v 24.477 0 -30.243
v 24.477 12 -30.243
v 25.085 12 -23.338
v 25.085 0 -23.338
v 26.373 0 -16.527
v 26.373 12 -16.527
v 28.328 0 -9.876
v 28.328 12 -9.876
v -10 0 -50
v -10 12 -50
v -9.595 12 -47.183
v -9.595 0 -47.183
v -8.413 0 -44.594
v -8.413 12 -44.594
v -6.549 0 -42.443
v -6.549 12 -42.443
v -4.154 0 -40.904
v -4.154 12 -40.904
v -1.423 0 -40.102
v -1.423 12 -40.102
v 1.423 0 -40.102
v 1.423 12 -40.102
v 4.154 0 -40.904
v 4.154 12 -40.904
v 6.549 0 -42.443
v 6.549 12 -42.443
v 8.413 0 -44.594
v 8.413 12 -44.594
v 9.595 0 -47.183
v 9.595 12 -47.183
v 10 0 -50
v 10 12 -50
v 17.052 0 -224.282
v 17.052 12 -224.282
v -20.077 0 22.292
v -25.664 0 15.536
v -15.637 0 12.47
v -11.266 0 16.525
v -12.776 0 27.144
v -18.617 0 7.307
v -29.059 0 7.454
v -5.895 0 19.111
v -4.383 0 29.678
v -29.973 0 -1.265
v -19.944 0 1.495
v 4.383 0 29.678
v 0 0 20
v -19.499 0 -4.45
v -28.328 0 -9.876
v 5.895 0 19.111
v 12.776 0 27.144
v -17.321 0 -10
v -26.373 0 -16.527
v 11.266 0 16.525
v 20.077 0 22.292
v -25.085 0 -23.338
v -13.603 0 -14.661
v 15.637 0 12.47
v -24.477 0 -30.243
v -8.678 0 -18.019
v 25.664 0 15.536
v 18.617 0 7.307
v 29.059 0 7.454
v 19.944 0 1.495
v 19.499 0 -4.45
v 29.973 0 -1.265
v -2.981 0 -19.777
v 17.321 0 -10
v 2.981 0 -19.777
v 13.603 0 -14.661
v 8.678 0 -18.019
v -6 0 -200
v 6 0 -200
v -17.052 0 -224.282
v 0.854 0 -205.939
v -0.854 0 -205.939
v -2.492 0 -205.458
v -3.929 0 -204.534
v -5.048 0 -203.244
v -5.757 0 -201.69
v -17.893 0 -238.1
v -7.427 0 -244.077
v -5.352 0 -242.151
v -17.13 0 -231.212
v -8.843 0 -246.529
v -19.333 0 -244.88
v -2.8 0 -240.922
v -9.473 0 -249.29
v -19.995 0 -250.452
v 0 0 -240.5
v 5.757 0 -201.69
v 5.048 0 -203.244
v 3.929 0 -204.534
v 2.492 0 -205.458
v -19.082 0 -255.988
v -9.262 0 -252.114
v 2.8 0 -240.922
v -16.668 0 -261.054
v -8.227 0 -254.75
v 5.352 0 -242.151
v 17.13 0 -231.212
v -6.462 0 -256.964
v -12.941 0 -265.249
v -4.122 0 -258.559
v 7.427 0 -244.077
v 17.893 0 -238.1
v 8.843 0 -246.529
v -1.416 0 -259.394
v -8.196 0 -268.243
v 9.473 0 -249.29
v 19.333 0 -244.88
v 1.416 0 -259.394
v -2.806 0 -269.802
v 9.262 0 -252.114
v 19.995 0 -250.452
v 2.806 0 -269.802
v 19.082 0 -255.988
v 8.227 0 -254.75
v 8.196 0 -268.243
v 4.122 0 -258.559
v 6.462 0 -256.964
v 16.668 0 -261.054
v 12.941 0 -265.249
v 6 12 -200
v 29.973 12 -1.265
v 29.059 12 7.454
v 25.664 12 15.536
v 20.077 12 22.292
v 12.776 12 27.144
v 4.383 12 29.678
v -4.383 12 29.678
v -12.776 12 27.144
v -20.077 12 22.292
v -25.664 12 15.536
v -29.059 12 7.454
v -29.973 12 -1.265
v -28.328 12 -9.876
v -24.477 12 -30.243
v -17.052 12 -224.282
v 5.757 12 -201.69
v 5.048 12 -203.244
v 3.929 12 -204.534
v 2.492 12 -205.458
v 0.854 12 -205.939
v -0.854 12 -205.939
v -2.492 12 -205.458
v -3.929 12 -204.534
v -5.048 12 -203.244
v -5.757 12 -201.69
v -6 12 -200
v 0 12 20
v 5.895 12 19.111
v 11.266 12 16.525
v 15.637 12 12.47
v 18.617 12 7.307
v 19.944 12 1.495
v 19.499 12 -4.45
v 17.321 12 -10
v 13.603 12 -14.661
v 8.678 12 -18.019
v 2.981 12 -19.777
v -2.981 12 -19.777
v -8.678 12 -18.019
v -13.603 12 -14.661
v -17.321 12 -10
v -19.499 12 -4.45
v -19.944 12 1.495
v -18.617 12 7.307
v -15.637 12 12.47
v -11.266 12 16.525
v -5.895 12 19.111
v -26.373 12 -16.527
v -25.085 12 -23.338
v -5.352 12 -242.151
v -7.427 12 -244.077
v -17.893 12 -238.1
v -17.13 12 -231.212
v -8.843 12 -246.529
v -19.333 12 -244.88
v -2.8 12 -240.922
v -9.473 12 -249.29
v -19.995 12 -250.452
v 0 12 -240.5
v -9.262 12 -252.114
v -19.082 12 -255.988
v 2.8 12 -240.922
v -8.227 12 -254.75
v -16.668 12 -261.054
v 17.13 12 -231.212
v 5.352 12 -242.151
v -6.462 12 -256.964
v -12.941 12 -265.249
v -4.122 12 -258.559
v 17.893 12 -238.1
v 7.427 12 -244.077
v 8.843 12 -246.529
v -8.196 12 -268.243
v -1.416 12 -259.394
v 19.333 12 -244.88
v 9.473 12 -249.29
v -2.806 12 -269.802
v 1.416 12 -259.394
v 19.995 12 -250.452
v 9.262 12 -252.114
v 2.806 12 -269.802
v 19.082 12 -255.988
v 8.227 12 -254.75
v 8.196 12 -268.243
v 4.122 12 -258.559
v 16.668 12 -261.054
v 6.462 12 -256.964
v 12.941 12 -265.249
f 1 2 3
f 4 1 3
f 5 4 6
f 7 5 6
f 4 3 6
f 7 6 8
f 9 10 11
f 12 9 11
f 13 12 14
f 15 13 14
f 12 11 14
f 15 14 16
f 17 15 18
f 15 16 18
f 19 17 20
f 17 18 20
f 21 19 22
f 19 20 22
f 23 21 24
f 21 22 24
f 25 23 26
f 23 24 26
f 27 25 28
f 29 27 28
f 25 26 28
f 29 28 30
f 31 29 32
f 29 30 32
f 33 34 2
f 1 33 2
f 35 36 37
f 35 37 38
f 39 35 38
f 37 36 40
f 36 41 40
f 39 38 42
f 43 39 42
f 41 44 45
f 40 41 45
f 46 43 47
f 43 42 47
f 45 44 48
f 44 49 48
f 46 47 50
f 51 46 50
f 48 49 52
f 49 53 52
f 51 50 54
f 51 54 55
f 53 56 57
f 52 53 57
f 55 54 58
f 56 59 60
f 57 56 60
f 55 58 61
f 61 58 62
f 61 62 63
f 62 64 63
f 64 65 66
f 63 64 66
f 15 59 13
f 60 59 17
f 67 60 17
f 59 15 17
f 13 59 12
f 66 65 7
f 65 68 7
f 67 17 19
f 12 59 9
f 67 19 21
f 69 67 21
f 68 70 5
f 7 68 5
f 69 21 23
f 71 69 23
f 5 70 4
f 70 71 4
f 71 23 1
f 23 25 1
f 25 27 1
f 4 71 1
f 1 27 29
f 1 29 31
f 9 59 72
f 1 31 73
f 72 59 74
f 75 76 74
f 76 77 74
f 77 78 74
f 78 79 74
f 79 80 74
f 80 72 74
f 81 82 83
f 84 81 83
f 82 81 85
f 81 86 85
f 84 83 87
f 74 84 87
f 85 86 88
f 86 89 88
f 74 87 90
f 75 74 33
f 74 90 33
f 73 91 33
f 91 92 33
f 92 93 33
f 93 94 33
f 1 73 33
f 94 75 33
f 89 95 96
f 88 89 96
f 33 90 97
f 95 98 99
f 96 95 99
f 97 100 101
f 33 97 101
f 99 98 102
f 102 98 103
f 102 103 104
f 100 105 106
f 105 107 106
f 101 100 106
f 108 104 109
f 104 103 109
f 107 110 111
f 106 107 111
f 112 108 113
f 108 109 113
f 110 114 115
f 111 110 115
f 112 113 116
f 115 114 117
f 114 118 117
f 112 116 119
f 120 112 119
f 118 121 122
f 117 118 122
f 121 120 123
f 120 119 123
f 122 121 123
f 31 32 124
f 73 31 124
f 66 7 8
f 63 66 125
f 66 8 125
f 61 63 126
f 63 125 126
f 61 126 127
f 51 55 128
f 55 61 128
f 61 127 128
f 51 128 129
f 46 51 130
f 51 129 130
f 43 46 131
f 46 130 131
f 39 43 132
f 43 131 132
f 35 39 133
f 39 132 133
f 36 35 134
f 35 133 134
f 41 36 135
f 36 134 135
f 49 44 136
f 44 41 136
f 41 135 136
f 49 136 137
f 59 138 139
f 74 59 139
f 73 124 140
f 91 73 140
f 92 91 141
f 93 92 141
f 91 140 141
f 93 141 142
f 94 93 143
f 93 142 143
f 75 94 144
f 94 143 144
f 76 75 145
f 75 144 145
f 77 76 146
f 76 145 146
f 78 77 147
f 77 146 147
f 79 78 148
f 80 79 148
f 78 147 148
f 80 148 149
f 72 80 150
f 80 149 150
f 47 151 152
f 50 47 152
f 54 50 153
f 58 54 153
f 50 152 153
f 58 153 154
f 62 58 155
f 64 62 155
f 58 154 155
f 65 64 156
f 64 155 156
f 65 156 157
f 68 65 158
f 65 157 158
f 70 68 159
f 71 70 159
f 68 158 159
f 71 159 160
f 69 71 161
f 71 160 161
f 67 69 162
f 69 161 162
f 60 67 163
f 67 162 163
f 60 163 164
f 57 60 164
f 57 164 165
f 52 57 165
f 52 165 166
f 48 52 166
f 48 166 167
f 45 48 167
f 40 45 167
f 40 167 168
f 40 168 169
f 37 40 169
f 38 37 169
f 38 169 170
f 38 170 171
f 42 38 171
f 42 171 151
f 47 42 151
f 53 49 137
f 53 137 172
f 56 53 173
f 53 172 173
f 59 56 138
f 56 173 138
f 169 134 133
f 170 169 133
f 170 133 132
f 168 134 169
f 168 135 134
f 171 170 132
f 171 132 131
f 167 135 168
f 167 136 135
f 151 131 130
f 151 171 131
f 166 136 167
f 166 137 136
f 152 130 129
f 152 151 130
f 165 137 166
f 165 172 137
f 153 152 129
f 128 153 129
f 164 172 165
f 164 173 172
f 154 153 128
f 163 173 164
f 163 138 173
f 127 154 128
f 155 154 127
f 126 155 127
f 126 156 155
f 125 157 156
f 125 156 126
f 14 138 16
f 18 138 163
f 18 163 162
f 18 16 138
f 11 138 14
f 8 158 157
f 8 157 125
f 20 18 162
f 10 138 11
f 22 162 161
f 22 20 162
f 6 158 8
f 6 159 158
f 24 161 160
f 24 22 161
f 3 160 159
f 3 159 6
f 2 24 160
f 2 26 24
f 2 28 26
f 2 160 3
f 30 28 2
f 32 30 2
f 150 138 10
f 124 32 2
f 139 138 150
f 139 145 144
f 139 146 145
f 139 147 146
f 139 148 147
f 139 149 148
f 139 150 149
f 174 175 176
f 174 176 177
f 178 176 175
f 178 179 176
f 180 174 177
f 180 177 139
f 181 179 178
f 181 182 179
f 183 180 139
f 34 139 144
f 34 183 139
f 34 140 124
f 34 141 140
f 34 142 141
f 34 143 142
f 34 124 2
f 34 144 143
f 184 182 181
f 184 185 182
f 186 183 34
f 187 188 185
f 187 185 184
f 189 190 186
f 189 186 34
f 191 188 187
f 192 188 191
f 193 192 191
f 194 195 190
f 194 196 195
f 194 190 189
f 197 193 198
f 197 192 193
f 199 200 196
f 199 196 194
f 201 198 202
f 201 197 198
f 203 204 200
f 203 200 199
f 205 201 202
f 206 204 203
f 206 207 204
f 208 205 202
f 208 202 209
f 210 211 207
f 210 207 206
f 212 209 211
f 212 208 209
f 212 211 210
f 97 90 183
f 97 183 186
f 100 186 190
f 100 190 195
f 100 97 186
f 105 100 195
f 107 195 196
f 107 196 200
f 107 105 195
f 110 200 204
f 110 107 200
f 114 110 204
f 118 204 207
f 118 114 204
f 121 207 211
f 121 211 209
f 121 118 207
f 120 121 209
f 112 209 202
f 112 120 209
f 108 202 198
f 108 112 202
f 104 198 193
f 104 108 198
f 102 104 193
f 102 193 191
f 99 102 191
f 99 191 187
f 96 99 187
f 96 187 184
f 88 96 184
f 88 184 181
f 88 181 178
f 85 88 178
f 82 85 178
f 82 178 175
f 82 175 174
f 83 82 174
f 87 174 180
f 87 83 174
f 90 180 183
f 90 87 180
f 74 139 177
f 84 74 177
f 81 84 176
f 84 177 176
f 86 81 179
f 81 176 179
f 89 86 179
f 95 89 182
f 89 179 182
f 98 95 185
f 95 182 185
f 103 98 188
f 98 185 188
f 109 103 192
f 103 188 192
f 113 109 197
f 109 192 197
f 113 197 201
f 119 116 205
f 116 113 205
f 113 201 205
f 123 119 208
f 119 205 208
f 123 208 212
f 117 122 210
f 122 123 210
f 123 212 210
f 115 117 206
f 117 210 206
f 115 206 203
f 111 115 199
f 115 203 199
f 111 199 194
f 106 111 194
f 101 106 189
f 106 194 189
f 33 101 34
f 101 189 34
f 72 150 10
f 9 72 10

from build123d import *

# Parameters (mm, degrees)
SKETCH_1_R          = 5.05
SKETCH_1_R_2        = 9.5
EXTRUDE_1_DEPTH     = 12
FILLET_1_R          = 3
SKETCH_7_R          = 2.05
CUT_EXTRUDE_4_DEPTH = 277.39464539
EXTRUDE_6_DEPTH     = 12
SKETCH_8_R          = 13
CUT_EXTRUDE_5_DEPTH = 277.39464539
SKETCH_9_R          = 25
SKETCH_9_R_2        = 13
EXTRUDE_4_DEPTH     = 12
SKETCH_10_R         = 1.5
SKETCH_10_R_2       = 21.5
EXTRUDE_5_DEPTH     = 12
SKETCH_13_R         = 1.5
SKETCH_13_R_2       = 19.999997197
SKETCH_13_R_3       = 13
CUT_EXTRUDE_6_DEPTH = 25


with BuildPart() as part:
    # 草图1 → 凸台-拉伸1 (new body)
    with BuildSketch(Plane(origin=(0, 0, 0), x_dir=(1, 0, 0), z_dir=(0, 1, 0))):
        with BuildLine():
            Line((-17.992942616, -0.504), (-24.990198078, 249.3))
            ThreePointArc((-24.990198078, 249.3), (0, 275), (24.990198078, 249.3))
            Line((24.990198078, 249.3), (17.992942616, -0.504))
            ThreePointArc((17.992942616, -0.504), (0, -18), (-17.992942616, -0.504))
        make_face()
        with Locations(Location((0, 0, 0), (0, 0, 270))):
            Circle(SKETCH_1_R, mode=Mode.SUBTRACT)
        with Locations(Location((0, 250, 0), (0, 0, 270))):
            Circle(SKETCH_1_R_2, mode=Mode.SUBTRACT)
        Polygon((-16.444447487, 158.5), (-17.704941698, 203.5), (11.028871219, 137.174942267), align=None, mode=Mode.SUBTRACT)
        Polygon((15.954255294, 141), (18.475243716, 231), (-12, 219.5), align=None, mode=Mode.SUBTRACT)
    extrude(amount=EXTRUDE_1_DEPTH)

    # 圆角1
    fillet_1_edges = [part.edges().sort_by_distance(p)[0] for p in [
        (-16.444447487, 6, -158.5),
        (11.028871219, 6, -137.174942267),
        (-17.704941698, 6, -203.5),
        (18.475243716, 6, -231),
        (-12, 6, -219.5),
        (15.954255294, 6, -141),
    ]]
    fillet(fillet_1_edges, radius=FILLET_1_R)

    # 草图7 → 切除-拉伸4 (cut, through all)
    with BuildSketch(Plane(origin=(0, 12, 0), x_dir=(1, 0, 0), z_dir=(0, 1, 0))):
        with Locations(Location((15, 15, 0), (0, 0, 270))):
            Circle(SKETCH_7_R)
        with Locations(Location((-15, 15, 0), (0, 0, 270))):
            Circle(SKETCH_7_R)
        with Locations((-15, -15)):
            Circle(SKETCH_7_R)
        with Locations((15, -15)):
            Circle(SKETCH_7_R)
    extrude(amount=-CUT_EXTRUDE_4_DEPTH, mode=Mode.SUBTRACT)

    # 草图14 → 凸台-拉伸6 (add)
    with BuildSketch(Plane(origin=(0, 12, 0), x_dir=(1, 0, 0), z_dir=(0, 1, 0))):
        Polygon((-17.958821841, 235.186562879), (21.367198419, 232.917754018), (15.538653821, 131.889647666), (-22.497275836, 156.52002696), align=None)
    extrude(amount=-EXTRUDE_6_DEPTH)

    # 草图8 → 切除-拉伸5 (cut, through all)
    with BuildSketch(Plane(origin=(0, 12, 0), x_dir=(1, 0, 0), z_dir=(0, 1, 0))):
        with Locations(Location((0, 0, 0), (0, 0, 270))):
            Circle(SKETCH_8_R)
    extrude(amount=-CUT_EXTRUDE_5_DEPTH, mode=Mode.SUBTRACT)

    # 草图9 → 凸台-拉伸4 (add)
    with BuildSketch(Plane(origin=(0, 12, 0), x_dir=(1, 0, 0), z_dir=(0, 1, 0))):
        Circle(SKETCH_9_R)
        with Locations(Location((0, 0, 0), (0, 0, 270))):
            Circle(SKETCH_9_R_2, mode=Mode.SUBTRACT)
    extrude(amount=-EXTRUDE_4_DEPTH)

    # 草图10 → 凸台-拉伸5 (add)
    with BuildSketch(Plane(origin=(0, 12, 0), x_dir=(1, 0, 0), z_dir=(0, 1, 0))):
        with BuildLine():
            Line((-39.711049207, 4.799226071), (-40, 0))
            ThreePointArc((-40, 0), (0, -40), (40, 0))
            Line((40, 0), (39.711049207, 4.799226071))
            Line((39.711049207, 4.799226071), (24.990198078, 249.3))
            Line((24.990198078, 249.3), (18.993134598, 35.203136766))
            ThreePointArc((18.993134598, 35.203136766), (0, 40), (-18.993134598, 35.203136766))
            Line((-18.993134598, 35.203136766), (-24.990198078, 249.3))
            Line((-24.990198078, 249.3), (-39.711049207, 4.799226071))
        make_face()
        with Locations(Location((-31.493406412, -20.357194124, 0), (0, 0, 270))):
            Circle(SKETCH_10_R, mode=Mode.SUBTRACT)
        with Locations(Location((-37.210701127, 4.649055992, 0), (0, 0, 270))):
            Circle(SKETCH_10_R, mode=Mode.SUBTRACT)
        with Locations(Location((-11.039996826, -35.838086864, 0), (0, 0, 270))):
            Circle(SKETCH_10_R, mode=Mode.SUBTRACT)
        with Locations((-1.883144055, 37.452687066)):
            Circle(SKETCH_10_R, mode=Mode.SUBTRACT)
        with Locations(Location((14.579149971, -34.549940465, 0), (0, 0, 270))):
            Circle(SKETCH_10_R, mode=Mode.SUBTRACT)
        Circle(SKETCH_10_R_2, mode=Mode.SUBTRACT)
        with Locations(Location((33.376550467, -17.095492942, 0), (0, 0, 270))):
            Circle(SKETCH_10_R, mode=Mode.SUBTRACT)
        with Locations(Location((36.55669206, 8.358125723, 0), (0, 0, 270))):
            Circle(SKETCH_10_R, mode=Mode.SUBTRACT)
    extrude(amount=-EXTRUDE_5_DEPTH)

    # 草图13 → 切除-拉伸6 (cut)
    # profile 1 of 3: a face of its own
    with BuildSketch(Plane(origin=(0, 12, 0), x_dir=(1, 0, 0), z_dir=(0, 1, 0))):
        with BuildLine():
            ThreePointArc((-40, 0), (0, -40), (40, 0))
            Line((40, 0), (24.990198078, 249.3))
            ThreePointArc((24.990198078, 249.3), (0, 275), (-24.990198078, 249.3))
            Line((-24.990198078, 249.3), (-40, 0))
        make_face()
        with Locations((-31.493406412, -20.357194124)):
            Circle(SKETCH_13_R, mode=Mode.SUBTRACT)
        with Locations((-37.210701127, 4.649055992)):
            Circle(SKETCH_13_R, mode=Mode.SUBTRACT)
        with Locations((-11.039996826, -35.838086864)):
            Circle(SKETCH_13_R, mode=Mode.SUBTRACT)
        with Locations((14.579149971, -34.549940465)):
            Circle(SKETCH_13_R, mode=Mode.SUBTRACT)
        with Locations((33.376550467, -17.095492942)):
            Circle(SKETCH_13_R, mode=Mode.SUBTRACT)
        with Locations((36.55669206, 8.358125723)):
            Circle(SKETCH_13_R, mode=Mode.SUBTRACT)
        with BuildLine():
            ThreePointArc((-28.327815251, 9.875975047), (-25.64448638, 19.916210003), (-24.477251587, 30.243074713))
            Line((-24.477251587, 30.243074713), (-17.051673854, 224.281506908))
            ThreePointArc((-17.051673854, 224.281506908), (-17.426051547, 234.665479827), (-19.333438467, 244.879633115))
            ThreePointArc((-19.333438467, 244.879633115), (0, 270), (19.333438467, 244.879633115))
            ThreePointArc((19.333438467, 244.879633115), (17.426051547, 234.665479827), (17.051673854, 224.281506908))
            Line((17.051673854, 224.281506908), (24.477251587, 30.243074713))
            ThreePointArc((24.477251587, 30.243074713), (25.64448638, 19.916210003), (28.327815251, 9.875975047))
            ThreePointArc((28.327815251, 9.875975047), (0, -30), (-28.327815251, 9.875975047))
        make_face(mode=Mode.SUBTRACT)
    # profile 2 of 3: a face of its own
    with BuildSketch(Plane(origin=(0, 12, 0), x_dir=(1, 0, 0), z_dir=(0, 1, 0))):
        with BuildLine():
            ThreePointArc((6, 200), (0, 206), (-6, 200))
            Line((-6, 200), (-10, 50))
            ThreePointArc((-10, 50), (0, 40), (10, 50))
            Line((10, 50), (6, 200))
        make_face()
    # profile 3 of 3: a face of its own
    with BuildSketch(Plane(origin=(0, 12, 0), x_dir=(1, 0, 0), z_dir=(0, 1, 0))):
        with Locations(Location((0, 0, 0), (0, 0, 270))):
            Circle(SKETCH_13_R_2)
        Circle(SKETCH_13_R_3, mode=Mode.SUBTRACT)
    extrude(amount=-CUT_EXTRUDE_6_DEPTH, mode=Mode.SUBTRACT)


solid = part.part
